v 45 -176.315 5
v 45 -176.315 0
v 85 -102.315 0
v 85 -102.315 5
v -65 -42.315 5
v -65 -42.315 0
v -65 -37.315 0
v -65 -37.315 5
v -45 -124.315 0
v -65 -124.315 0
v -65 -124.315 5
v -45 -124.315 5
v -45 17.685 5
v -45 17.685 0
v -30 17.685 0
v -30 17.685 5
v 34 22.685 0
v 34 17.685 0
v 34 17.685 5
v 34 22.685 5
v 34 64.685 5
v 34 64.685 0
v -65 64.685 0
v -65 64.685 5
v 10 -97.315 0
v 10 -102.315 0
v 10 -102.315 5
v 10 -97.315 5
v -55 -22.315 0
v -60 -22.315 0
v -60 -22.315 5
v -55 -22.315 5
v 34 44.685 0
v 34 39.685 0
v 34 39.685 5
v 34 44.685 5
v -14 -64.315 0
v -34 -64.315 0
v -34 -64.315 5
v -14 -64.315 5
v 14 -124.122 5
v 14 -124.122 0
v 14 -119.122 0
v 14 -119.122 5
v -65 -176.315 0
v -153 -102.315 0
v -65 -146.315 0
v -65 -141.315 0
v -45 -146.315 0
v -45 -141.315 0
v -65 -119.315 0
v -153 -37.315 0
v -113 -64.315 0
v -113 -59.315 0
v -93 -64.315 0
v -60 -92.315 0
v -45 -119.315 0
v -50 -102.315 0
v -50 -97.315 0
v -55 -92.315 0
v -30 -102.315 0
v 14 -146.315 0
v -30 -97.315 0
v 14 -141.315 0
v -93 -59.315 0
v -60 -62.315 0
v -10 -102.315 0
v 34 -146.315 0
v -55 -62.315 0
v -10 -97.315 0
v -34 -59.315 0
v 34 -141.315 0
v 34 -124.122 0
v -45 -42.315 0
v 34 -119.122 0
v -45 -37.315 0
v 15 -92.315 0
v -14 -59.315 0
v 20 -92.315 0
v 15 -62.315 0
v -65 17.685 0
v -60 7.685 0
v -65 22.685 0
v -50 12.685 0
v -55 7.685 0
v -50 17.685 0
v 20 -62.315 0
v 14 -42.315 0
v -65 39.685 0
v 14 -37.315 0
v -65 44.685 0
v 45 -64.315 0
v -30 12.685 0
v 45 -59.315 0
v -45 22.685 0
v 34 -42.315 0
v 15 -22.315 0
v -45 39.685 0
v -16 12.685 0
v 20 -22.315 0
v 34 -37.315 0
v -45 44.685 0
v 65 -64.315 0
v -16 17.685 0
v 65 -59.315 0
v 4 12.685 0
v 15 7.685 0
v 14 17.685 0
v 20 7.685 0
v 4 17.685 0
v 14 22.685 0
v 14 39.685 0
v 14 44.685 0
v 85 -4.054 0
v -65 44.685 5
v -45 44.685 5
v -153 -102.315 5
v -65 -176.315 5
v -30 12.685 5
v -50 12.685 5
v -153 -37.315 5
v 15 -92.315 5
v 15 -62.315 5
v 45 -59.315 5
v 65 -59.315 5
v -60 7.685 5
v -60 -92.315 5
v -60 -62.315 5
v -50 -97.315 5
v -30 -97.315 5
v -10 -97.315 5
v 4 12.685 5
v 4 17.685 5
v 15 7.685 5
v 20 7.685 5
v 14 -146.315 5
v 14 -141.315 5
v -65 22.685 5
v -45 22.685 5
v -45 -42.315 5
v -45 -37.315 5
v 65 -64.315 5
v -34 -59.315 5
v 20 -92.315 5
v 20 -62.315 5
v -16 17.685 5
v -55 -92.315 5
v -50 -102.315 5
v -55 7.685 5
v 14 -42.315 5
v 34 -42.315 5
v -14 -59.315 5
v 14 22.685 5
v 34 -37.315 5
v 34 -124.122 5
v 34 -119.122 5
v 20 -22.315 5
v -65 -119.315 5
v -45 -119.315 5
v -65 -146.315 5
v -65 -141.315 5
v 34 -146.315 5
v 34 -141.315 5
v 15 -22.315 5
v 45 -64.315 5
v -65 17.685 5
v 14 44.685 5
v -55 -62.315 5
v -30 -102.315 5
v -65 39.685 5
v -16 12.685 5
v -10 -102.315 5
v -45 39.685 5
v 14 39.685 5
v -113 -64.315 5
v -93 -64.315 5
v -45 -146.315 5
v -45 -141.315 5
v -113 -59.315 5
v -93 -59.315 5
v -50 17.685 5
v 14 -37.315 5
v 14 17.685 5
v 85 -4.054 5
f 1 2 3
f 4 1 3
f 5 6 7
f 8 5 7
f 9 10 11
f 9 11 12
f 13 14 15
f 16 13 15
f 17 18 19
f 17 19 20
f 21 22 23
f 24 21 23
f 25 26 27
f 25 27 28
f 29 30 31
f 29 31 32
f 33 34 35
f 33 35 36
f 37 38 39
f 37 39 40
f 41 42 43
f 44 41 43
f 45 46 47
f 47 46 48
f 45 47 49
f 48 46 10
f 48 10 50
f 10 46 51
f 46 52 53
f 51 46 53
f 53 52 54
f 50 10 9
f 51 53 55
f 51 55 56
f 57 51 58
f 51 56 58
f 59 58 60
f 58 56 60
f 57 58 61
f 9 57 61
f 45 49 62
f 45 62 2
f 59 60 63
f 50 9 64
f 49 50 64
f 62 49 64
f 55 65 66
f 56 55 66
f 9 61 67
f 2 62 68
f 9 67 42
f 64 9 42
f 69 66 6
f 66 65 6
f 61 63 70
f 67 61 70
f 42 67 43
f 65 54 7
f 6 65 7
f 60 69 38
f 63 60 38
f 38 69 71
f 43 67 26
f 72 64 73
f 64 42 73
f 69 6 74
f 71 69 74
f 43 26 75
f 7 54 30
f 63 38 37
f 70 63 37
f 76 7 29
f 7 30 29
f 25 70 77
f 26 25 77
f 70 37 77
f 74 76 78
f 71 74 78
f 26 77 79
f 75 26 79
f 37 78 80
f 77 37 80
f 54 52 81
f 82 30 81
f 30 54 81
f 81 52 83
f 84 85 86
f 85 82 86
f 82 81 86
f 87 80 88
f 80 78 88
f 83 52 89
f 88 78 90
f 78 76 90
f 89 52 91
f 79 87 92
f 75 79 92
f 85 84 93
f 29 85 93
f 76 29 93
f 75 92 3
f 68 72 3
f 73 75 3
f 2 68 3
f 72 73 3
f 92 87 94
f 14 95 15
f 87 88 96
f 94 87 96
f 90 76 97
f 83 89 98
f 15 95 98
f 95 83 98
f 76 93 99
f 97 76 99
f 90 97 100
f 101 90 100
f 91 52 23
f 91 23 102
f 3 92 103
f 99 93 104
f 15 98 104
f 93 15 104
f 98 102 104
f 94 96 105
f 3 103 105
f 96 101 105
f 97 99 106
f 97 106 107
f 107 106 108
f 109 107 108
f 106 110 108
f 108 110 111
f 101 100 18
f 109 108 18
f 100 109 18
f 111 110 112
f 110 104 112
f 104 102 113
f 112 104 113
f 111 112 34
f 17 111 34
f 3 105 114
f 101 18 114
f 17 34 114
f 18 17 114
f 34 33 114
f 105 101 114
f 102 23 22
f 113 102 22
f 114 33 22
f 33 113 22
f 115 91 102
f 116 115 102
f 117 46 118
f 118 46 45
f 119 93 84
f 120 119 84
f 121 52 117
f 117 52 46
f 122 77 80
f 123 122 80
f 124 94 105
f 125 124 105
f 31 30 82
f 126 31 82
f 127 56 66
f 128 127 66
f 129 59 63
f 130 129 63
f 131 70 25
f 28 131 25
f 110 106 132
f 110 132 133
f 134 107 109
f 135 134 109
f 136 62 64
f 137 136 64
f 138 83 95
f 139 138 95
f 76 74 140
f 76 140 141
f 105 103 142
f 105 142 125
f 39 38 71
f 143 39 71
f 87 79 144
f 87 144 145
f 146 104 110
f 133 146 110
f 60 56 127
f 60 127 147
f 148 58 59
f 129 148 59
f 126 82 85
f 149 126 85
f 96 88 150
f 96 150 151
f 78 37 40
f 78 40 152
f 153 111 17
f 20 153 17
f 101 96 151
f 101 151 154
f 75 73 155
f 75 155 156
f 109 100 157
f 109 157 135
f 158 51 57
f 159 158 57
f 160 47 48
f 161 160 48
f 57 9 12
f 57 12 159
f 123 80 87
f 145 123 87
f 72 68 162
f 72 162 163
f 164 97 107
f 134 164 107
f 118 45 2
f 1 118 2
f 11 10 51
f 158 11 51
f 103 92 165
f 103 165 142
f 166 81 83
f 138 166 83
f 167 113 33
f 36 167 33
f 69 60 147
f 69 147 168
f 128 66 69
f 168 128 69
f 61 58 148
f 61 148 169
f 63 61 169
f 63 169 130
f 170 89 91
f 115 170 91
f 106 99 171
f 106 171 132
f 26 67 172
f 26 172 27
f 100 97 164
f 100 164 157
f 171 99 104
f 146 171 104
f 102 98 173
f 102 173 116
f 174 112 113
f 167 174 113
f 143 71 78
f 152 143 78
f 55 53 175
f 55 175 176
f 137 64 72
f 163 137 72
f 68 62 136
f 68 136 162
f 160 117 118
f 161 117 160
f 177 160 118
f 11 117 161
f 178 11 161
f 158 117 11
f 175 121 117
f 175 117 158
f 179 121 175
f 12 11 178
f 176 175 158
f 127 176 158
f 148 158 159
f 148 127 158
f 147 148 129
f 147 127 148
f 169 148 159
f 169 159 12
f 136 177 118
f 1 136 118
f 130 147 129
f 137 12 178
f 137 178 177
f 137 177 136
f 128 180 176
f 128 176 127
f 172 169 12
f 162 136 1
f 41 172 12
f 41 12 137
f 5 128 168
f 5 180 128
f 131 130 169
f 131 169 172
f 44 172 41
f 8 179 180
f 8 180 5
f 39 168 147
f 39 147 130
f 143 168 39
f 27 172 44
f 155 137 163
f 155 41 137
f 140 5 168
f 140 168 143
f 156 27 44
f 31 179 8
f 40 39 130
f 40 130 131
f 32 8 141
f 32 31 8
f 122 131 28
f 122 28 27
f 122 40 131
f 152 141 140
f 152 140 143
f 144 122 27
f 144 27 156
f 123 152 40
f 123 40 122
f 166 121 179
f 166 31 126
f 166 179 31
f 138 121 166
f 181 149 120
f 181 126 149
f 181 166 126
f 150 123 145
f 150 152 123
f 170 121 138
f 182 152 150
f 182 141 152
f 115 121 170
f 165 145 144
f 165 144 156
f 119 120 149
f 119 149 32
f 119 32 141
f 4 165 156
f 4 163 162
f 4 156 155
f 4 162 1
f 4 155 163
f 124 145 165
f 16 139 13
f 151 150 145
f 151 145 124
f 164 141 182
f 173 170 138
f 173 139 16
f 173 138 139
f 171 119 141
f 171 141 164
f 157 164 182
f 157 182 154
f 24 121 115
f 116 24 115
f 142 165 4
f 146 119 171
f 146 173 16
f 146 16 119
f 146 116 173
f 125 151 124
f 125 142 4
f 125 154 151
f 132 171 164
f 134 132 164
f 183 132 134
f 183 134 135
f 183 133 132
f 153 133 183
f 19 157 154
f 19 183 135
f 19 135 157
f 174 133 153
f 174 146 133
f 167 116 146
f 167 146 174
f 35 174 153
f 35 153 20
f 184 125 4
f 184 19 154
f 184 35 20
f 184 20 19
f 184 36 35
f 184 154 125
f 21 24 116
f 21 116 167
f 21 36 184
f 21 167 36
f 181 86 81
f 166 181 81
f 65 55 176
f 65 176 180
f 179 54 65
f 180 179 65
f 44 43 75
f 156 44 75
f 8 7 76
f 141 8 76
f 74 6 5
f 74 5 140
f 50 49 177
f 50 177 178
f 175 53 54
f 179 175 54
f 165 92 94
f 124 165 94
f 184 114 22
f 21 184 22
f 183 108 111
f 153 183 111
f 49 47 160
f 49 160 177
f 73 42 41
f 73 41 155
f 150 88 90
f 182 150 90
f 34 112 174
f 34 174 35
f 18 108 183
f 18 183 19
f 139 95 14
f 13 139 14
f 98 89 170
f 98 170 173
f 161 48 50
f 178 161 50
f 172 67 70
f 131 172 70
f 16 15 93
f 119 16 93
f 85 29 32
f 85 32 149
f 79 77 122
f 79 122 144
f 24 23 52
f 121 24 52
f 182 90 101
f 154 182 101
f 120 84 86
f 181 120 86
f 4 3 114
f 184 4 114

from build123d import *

# Parameters (mm, degrees)
SKETCH1_W           = 20
SKETCH1_H           = 5
SKETCH1_W_2         = 5
SKETCH1_H_2         = 30
BOSS_EXTRUDE1_DEPTH = 5


with BuildPart() as part:
    # Sketch1 → Boss-Extrude1 (new body)
    with BuildSketch(Plane.XY):
        Polygon((85, -102.314739042), (85, -4.053866158), (34, 64.685260958), (-65, 64.685260958), (-153, -37.314739042), (-153, -102.314739042), (-65, -176.314739042), (45, -176.314739042), align=None)
        with Locations((-55, -143.814739042)):
            Rectangle(SKETCH1_W, SKETCH1_H, mode=Mode.SUBTRACT)
        with Locations((-55, -121.814739042)):
            Rectangle(SKETCH1_W, SKETCH1_H, mode=Mode.SUBTRACT)
        with Locations((-103, -61.814739042)):
            Rectangle(SKETCH1_W, SKETCH1_H, mode=Mode.SUBTRACT)
        with Locations((-40, -99.814739042)):
            Rectangle(SKETCH1_W, SKETCH1_H, mode=Mode.SUBTRACT)
        with Locations((-57.5, -77.314739042)):
            Rectangle(SKETCH1_W_2, SKETCH1_H_2, mode=Mode.SUBTRACT)
        with Locations((24, -143.814739042)):
            Rectangle(SKETCH1_W, SKETCH1_H, mode=Mode.SUBTRACT)
        with Locations((24, -121.622499161)):
            Rectangle(SKETCH1_W, SKETCH1_H, mode=Mode.SUBTRACT)
        with Locations((0, -99.814739042)):
            Rectangle(SKETCH1_W, SKETCH1_H, mode=Mode.SUBTRACT)
        with Locations((-24, -61.814739042)):
            Rectangle(SKETCH1_W, SKETCH1_H, mode=Mode.SUBTRACT)
        with Locations((17.5, -77.314739042)):
            Rectangle(SKETCH1_W_2, SKETCH1_H_2, mode=Mode.SUBTRACT)
        with Locations((55, -61.814739042)):
            Rectangle(SKETCH1_W, SKETCH1_H, mode=Mode.SUBTRACT)
        with Locations((-55, -39.814739042)):
            Rectangle(SKETCH1_W, SKETCH1_H, mode=Mode.SUBTRACT)
        with Locations((-57.5, -7.314739042)):
            Rectangle(SKETCH1_W_2, SKETCH1_H_2, mode=Mode.SUBTRACT)
        Polygon((-65, 22.685260958), (-45, 22.685260958), (-45, 17.685260958), (-30, 17.685260958), (-30, 12.685260958), (-50, 12.685260958), (-50, 17.685260958), (-65, 17.685260958), align=None, mode=Mode.SUBTRACT)
        with Locations((-55, 42.185260958)):
            Rectangle(SKETCH1_W, SKETCH1_H, mode=Mode.SUBTRACT)
        with Locations((24, -39.814739042)):
            Rectangle(SKETCH1_W, SKETCH1_H, mode=Mode.SUBTRACT)
        with Locations((17.5, -7.314739042)):
            Rectangle(SKETCH1_W_2, SKETCH1_H_2, mode=Mode.SUBTRACT)
        with Locations((-6, 15.185260958)):
            Rectangle(SKETCH1_W, SKETCH1_H, mode=Mode.SUBTRACT)
        with Locations((24, 20.185260958)):
            Rectangle(SKETCH1_W, SKETCH1_H, mode=Mode.SUBTRACT)
        with Locations((24, 42.185260958)):
            Rectangle(SKETCH1_W, SKETCH1_H, mode=Mode.SUBTRACT)
    extrude(amount=BOSS_EXTRUDE1_DEPTH)


solid = part.part
